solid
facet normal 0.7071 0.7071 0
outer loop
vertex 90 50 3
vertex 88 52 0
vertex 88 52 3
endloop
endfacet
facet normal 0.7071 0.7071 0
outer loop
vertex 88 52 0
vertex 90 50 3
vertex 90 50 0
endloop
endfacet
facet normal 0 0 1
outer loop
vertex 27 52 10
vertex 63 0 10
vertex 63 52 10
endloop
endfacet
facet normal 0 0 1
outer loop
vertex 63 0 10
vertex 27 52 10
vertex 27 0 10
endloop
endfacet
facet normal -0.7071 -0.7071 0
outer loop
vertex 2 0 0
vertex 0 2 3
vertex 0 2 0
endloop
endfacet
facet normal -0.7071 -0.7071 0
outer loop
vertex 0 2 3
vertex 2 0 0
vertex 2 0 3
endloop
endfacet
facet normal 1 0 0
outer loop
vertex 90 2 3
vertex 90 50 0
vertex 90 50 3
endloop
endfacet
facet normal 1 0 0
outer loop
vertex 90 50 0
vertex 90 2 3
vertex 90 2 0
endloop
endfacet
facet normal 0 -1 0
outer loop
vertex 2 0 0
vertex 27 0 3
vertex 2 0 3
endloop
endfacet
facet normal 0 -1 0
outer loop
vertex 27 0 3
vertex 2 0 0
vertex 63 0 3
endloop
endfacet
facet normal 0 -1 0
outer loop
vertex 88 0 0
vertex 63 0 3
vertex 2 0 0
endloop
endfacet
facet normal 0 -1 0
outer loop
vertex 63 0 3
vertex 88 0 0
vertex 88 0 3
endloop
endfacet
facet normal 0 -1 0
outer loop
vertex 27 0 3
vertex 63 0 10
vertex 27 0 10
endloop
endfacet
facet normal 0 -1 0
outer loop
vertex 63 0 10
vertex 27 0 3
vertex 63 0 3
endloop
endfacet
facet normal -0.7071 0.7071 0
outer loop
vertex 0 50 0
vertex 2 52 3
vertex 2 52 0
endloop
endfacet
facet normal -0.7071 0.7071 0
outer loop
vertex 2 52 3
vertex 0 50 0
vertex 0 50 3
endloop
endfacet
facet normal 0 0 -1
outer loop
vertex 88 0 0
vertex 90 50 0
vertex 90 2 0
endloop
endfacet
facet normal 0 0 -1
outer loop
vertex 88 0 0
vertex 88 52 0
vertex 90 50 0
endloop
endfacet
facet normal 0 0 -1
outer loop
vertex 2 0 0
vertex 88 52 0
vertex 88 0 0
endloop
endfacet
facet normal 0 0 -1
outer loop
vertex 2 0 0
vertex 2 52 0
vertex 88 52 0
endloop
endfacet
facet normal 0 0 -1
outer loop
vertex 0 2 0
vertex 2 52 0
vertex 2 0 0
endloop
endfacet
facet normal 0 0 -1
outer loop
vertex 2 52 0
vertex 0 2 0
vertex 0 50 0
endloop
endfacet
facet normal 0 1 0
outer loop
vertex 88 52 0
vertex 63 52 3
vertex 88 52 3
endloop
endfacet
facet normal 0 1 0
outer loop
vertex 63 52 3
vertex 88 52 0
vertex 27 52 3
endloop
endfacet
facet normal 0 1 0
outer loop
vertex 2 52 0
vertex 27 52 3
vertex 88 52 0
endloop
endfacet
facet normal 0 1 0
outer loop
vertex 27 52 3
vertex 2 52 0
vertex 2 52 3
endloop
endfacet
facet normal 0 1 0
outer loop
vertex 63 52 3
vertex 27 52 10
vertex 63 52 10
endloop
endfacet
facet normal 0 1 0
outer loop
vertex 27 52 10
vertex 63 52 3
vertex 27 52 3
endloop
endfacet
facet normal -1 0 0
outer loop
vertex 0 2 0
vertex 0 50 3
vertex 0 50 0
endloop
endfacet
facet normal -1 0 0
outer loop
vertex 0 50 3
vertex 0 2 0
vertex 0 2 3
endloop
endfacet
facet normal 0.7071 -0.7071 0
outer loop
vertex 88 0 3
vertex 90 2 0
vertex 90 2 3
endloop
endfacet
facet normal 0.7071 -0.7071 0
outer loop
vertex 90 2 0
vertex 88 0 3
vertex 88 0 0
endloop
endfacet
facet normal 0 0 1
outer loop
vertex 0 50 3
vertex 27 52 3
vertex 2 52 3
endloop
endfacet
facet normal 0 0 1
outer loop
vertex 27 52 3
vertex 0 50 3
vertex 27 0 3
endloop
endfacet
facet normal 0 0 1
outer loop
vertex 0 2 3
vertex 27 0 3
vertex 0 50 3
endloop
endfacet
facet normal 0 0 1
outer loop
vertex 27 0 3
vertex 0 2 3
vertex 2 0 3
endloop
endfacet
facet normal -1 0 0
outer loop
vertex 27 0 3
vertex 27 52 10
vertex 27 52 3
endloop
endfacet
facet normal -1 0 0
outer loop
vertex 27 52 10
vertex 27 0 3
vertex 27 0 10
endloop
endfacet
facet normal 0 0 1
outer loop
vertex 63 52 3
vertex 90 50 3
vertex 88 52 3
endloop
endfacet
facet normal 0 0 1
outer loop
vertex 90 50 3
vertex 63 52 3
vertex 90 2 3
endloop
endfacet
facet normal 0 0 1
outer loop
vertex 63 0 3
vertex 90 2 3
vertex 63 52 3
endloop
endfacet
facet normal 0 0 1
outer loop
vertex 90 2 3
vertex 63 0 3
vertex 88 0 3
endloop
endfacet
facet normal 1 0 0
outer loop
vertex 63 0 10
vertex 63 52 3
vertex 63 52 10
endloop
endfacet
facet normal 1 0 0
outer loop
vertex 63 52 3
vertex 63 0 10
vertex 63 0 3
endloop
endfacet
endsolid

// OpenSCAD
$fn = 32;

// ----------------------------------------------------------------------
// Stepped bar: centerstep, 90 x 52 x 10/3 mm
// ----------------------------------------------------------------------

// --- parameters (mm) ---
bar_l = 90;               // bar length, X
bar_w = 52;               // bar width, Y
plate_t = 10;             // thickness of the thick zone, Z
thin_t = 3;               // thickness of the thin zone
corner_c = 2;             // corner chamfer of the bar
step_cut = 7;             // material removed from the thin zone
thick_from = 27;          // start of the thick middle zone
thick_to = 63;            // end of the thick middle zone
depth_1 = 7;              // depth of cut 1 from the top face
depth_2 = 7;              // depth of cut 2 from the top face
fit_tol = 0.05;           // declared fit tolerance (prompt contract)
free_tol = 0.2;           // declared free tolerance (prompt contract)

profile = [[2, 0], [88, 0], [90, 2], [90, 50], [88, 52], [2, 52], [0, 50], [0, 2]];  // primary outline, 8 points, counter clockwise
void_1 = [[-1, -1], [27, -1], [27, 53], [-1, 53]];  // thin left end, 4 points
void_2 = [[63, -1], [91, -1], [91, 53], [63, 53]];  // thin right end, 4 points

// --- the one profile operation ---
difference() {
  linear_extrude(height = plate_t) polygon(points = profile);
  translate([0, 0, plate_t - depth_1])
    linear_extrude(height = depth_1 + 1) polygon(points = void_1);
  translate([0, 0, plate_t - depth_2])
    linear_extrude(height = depth_2 + 1) polygon(points = void_2);
}
